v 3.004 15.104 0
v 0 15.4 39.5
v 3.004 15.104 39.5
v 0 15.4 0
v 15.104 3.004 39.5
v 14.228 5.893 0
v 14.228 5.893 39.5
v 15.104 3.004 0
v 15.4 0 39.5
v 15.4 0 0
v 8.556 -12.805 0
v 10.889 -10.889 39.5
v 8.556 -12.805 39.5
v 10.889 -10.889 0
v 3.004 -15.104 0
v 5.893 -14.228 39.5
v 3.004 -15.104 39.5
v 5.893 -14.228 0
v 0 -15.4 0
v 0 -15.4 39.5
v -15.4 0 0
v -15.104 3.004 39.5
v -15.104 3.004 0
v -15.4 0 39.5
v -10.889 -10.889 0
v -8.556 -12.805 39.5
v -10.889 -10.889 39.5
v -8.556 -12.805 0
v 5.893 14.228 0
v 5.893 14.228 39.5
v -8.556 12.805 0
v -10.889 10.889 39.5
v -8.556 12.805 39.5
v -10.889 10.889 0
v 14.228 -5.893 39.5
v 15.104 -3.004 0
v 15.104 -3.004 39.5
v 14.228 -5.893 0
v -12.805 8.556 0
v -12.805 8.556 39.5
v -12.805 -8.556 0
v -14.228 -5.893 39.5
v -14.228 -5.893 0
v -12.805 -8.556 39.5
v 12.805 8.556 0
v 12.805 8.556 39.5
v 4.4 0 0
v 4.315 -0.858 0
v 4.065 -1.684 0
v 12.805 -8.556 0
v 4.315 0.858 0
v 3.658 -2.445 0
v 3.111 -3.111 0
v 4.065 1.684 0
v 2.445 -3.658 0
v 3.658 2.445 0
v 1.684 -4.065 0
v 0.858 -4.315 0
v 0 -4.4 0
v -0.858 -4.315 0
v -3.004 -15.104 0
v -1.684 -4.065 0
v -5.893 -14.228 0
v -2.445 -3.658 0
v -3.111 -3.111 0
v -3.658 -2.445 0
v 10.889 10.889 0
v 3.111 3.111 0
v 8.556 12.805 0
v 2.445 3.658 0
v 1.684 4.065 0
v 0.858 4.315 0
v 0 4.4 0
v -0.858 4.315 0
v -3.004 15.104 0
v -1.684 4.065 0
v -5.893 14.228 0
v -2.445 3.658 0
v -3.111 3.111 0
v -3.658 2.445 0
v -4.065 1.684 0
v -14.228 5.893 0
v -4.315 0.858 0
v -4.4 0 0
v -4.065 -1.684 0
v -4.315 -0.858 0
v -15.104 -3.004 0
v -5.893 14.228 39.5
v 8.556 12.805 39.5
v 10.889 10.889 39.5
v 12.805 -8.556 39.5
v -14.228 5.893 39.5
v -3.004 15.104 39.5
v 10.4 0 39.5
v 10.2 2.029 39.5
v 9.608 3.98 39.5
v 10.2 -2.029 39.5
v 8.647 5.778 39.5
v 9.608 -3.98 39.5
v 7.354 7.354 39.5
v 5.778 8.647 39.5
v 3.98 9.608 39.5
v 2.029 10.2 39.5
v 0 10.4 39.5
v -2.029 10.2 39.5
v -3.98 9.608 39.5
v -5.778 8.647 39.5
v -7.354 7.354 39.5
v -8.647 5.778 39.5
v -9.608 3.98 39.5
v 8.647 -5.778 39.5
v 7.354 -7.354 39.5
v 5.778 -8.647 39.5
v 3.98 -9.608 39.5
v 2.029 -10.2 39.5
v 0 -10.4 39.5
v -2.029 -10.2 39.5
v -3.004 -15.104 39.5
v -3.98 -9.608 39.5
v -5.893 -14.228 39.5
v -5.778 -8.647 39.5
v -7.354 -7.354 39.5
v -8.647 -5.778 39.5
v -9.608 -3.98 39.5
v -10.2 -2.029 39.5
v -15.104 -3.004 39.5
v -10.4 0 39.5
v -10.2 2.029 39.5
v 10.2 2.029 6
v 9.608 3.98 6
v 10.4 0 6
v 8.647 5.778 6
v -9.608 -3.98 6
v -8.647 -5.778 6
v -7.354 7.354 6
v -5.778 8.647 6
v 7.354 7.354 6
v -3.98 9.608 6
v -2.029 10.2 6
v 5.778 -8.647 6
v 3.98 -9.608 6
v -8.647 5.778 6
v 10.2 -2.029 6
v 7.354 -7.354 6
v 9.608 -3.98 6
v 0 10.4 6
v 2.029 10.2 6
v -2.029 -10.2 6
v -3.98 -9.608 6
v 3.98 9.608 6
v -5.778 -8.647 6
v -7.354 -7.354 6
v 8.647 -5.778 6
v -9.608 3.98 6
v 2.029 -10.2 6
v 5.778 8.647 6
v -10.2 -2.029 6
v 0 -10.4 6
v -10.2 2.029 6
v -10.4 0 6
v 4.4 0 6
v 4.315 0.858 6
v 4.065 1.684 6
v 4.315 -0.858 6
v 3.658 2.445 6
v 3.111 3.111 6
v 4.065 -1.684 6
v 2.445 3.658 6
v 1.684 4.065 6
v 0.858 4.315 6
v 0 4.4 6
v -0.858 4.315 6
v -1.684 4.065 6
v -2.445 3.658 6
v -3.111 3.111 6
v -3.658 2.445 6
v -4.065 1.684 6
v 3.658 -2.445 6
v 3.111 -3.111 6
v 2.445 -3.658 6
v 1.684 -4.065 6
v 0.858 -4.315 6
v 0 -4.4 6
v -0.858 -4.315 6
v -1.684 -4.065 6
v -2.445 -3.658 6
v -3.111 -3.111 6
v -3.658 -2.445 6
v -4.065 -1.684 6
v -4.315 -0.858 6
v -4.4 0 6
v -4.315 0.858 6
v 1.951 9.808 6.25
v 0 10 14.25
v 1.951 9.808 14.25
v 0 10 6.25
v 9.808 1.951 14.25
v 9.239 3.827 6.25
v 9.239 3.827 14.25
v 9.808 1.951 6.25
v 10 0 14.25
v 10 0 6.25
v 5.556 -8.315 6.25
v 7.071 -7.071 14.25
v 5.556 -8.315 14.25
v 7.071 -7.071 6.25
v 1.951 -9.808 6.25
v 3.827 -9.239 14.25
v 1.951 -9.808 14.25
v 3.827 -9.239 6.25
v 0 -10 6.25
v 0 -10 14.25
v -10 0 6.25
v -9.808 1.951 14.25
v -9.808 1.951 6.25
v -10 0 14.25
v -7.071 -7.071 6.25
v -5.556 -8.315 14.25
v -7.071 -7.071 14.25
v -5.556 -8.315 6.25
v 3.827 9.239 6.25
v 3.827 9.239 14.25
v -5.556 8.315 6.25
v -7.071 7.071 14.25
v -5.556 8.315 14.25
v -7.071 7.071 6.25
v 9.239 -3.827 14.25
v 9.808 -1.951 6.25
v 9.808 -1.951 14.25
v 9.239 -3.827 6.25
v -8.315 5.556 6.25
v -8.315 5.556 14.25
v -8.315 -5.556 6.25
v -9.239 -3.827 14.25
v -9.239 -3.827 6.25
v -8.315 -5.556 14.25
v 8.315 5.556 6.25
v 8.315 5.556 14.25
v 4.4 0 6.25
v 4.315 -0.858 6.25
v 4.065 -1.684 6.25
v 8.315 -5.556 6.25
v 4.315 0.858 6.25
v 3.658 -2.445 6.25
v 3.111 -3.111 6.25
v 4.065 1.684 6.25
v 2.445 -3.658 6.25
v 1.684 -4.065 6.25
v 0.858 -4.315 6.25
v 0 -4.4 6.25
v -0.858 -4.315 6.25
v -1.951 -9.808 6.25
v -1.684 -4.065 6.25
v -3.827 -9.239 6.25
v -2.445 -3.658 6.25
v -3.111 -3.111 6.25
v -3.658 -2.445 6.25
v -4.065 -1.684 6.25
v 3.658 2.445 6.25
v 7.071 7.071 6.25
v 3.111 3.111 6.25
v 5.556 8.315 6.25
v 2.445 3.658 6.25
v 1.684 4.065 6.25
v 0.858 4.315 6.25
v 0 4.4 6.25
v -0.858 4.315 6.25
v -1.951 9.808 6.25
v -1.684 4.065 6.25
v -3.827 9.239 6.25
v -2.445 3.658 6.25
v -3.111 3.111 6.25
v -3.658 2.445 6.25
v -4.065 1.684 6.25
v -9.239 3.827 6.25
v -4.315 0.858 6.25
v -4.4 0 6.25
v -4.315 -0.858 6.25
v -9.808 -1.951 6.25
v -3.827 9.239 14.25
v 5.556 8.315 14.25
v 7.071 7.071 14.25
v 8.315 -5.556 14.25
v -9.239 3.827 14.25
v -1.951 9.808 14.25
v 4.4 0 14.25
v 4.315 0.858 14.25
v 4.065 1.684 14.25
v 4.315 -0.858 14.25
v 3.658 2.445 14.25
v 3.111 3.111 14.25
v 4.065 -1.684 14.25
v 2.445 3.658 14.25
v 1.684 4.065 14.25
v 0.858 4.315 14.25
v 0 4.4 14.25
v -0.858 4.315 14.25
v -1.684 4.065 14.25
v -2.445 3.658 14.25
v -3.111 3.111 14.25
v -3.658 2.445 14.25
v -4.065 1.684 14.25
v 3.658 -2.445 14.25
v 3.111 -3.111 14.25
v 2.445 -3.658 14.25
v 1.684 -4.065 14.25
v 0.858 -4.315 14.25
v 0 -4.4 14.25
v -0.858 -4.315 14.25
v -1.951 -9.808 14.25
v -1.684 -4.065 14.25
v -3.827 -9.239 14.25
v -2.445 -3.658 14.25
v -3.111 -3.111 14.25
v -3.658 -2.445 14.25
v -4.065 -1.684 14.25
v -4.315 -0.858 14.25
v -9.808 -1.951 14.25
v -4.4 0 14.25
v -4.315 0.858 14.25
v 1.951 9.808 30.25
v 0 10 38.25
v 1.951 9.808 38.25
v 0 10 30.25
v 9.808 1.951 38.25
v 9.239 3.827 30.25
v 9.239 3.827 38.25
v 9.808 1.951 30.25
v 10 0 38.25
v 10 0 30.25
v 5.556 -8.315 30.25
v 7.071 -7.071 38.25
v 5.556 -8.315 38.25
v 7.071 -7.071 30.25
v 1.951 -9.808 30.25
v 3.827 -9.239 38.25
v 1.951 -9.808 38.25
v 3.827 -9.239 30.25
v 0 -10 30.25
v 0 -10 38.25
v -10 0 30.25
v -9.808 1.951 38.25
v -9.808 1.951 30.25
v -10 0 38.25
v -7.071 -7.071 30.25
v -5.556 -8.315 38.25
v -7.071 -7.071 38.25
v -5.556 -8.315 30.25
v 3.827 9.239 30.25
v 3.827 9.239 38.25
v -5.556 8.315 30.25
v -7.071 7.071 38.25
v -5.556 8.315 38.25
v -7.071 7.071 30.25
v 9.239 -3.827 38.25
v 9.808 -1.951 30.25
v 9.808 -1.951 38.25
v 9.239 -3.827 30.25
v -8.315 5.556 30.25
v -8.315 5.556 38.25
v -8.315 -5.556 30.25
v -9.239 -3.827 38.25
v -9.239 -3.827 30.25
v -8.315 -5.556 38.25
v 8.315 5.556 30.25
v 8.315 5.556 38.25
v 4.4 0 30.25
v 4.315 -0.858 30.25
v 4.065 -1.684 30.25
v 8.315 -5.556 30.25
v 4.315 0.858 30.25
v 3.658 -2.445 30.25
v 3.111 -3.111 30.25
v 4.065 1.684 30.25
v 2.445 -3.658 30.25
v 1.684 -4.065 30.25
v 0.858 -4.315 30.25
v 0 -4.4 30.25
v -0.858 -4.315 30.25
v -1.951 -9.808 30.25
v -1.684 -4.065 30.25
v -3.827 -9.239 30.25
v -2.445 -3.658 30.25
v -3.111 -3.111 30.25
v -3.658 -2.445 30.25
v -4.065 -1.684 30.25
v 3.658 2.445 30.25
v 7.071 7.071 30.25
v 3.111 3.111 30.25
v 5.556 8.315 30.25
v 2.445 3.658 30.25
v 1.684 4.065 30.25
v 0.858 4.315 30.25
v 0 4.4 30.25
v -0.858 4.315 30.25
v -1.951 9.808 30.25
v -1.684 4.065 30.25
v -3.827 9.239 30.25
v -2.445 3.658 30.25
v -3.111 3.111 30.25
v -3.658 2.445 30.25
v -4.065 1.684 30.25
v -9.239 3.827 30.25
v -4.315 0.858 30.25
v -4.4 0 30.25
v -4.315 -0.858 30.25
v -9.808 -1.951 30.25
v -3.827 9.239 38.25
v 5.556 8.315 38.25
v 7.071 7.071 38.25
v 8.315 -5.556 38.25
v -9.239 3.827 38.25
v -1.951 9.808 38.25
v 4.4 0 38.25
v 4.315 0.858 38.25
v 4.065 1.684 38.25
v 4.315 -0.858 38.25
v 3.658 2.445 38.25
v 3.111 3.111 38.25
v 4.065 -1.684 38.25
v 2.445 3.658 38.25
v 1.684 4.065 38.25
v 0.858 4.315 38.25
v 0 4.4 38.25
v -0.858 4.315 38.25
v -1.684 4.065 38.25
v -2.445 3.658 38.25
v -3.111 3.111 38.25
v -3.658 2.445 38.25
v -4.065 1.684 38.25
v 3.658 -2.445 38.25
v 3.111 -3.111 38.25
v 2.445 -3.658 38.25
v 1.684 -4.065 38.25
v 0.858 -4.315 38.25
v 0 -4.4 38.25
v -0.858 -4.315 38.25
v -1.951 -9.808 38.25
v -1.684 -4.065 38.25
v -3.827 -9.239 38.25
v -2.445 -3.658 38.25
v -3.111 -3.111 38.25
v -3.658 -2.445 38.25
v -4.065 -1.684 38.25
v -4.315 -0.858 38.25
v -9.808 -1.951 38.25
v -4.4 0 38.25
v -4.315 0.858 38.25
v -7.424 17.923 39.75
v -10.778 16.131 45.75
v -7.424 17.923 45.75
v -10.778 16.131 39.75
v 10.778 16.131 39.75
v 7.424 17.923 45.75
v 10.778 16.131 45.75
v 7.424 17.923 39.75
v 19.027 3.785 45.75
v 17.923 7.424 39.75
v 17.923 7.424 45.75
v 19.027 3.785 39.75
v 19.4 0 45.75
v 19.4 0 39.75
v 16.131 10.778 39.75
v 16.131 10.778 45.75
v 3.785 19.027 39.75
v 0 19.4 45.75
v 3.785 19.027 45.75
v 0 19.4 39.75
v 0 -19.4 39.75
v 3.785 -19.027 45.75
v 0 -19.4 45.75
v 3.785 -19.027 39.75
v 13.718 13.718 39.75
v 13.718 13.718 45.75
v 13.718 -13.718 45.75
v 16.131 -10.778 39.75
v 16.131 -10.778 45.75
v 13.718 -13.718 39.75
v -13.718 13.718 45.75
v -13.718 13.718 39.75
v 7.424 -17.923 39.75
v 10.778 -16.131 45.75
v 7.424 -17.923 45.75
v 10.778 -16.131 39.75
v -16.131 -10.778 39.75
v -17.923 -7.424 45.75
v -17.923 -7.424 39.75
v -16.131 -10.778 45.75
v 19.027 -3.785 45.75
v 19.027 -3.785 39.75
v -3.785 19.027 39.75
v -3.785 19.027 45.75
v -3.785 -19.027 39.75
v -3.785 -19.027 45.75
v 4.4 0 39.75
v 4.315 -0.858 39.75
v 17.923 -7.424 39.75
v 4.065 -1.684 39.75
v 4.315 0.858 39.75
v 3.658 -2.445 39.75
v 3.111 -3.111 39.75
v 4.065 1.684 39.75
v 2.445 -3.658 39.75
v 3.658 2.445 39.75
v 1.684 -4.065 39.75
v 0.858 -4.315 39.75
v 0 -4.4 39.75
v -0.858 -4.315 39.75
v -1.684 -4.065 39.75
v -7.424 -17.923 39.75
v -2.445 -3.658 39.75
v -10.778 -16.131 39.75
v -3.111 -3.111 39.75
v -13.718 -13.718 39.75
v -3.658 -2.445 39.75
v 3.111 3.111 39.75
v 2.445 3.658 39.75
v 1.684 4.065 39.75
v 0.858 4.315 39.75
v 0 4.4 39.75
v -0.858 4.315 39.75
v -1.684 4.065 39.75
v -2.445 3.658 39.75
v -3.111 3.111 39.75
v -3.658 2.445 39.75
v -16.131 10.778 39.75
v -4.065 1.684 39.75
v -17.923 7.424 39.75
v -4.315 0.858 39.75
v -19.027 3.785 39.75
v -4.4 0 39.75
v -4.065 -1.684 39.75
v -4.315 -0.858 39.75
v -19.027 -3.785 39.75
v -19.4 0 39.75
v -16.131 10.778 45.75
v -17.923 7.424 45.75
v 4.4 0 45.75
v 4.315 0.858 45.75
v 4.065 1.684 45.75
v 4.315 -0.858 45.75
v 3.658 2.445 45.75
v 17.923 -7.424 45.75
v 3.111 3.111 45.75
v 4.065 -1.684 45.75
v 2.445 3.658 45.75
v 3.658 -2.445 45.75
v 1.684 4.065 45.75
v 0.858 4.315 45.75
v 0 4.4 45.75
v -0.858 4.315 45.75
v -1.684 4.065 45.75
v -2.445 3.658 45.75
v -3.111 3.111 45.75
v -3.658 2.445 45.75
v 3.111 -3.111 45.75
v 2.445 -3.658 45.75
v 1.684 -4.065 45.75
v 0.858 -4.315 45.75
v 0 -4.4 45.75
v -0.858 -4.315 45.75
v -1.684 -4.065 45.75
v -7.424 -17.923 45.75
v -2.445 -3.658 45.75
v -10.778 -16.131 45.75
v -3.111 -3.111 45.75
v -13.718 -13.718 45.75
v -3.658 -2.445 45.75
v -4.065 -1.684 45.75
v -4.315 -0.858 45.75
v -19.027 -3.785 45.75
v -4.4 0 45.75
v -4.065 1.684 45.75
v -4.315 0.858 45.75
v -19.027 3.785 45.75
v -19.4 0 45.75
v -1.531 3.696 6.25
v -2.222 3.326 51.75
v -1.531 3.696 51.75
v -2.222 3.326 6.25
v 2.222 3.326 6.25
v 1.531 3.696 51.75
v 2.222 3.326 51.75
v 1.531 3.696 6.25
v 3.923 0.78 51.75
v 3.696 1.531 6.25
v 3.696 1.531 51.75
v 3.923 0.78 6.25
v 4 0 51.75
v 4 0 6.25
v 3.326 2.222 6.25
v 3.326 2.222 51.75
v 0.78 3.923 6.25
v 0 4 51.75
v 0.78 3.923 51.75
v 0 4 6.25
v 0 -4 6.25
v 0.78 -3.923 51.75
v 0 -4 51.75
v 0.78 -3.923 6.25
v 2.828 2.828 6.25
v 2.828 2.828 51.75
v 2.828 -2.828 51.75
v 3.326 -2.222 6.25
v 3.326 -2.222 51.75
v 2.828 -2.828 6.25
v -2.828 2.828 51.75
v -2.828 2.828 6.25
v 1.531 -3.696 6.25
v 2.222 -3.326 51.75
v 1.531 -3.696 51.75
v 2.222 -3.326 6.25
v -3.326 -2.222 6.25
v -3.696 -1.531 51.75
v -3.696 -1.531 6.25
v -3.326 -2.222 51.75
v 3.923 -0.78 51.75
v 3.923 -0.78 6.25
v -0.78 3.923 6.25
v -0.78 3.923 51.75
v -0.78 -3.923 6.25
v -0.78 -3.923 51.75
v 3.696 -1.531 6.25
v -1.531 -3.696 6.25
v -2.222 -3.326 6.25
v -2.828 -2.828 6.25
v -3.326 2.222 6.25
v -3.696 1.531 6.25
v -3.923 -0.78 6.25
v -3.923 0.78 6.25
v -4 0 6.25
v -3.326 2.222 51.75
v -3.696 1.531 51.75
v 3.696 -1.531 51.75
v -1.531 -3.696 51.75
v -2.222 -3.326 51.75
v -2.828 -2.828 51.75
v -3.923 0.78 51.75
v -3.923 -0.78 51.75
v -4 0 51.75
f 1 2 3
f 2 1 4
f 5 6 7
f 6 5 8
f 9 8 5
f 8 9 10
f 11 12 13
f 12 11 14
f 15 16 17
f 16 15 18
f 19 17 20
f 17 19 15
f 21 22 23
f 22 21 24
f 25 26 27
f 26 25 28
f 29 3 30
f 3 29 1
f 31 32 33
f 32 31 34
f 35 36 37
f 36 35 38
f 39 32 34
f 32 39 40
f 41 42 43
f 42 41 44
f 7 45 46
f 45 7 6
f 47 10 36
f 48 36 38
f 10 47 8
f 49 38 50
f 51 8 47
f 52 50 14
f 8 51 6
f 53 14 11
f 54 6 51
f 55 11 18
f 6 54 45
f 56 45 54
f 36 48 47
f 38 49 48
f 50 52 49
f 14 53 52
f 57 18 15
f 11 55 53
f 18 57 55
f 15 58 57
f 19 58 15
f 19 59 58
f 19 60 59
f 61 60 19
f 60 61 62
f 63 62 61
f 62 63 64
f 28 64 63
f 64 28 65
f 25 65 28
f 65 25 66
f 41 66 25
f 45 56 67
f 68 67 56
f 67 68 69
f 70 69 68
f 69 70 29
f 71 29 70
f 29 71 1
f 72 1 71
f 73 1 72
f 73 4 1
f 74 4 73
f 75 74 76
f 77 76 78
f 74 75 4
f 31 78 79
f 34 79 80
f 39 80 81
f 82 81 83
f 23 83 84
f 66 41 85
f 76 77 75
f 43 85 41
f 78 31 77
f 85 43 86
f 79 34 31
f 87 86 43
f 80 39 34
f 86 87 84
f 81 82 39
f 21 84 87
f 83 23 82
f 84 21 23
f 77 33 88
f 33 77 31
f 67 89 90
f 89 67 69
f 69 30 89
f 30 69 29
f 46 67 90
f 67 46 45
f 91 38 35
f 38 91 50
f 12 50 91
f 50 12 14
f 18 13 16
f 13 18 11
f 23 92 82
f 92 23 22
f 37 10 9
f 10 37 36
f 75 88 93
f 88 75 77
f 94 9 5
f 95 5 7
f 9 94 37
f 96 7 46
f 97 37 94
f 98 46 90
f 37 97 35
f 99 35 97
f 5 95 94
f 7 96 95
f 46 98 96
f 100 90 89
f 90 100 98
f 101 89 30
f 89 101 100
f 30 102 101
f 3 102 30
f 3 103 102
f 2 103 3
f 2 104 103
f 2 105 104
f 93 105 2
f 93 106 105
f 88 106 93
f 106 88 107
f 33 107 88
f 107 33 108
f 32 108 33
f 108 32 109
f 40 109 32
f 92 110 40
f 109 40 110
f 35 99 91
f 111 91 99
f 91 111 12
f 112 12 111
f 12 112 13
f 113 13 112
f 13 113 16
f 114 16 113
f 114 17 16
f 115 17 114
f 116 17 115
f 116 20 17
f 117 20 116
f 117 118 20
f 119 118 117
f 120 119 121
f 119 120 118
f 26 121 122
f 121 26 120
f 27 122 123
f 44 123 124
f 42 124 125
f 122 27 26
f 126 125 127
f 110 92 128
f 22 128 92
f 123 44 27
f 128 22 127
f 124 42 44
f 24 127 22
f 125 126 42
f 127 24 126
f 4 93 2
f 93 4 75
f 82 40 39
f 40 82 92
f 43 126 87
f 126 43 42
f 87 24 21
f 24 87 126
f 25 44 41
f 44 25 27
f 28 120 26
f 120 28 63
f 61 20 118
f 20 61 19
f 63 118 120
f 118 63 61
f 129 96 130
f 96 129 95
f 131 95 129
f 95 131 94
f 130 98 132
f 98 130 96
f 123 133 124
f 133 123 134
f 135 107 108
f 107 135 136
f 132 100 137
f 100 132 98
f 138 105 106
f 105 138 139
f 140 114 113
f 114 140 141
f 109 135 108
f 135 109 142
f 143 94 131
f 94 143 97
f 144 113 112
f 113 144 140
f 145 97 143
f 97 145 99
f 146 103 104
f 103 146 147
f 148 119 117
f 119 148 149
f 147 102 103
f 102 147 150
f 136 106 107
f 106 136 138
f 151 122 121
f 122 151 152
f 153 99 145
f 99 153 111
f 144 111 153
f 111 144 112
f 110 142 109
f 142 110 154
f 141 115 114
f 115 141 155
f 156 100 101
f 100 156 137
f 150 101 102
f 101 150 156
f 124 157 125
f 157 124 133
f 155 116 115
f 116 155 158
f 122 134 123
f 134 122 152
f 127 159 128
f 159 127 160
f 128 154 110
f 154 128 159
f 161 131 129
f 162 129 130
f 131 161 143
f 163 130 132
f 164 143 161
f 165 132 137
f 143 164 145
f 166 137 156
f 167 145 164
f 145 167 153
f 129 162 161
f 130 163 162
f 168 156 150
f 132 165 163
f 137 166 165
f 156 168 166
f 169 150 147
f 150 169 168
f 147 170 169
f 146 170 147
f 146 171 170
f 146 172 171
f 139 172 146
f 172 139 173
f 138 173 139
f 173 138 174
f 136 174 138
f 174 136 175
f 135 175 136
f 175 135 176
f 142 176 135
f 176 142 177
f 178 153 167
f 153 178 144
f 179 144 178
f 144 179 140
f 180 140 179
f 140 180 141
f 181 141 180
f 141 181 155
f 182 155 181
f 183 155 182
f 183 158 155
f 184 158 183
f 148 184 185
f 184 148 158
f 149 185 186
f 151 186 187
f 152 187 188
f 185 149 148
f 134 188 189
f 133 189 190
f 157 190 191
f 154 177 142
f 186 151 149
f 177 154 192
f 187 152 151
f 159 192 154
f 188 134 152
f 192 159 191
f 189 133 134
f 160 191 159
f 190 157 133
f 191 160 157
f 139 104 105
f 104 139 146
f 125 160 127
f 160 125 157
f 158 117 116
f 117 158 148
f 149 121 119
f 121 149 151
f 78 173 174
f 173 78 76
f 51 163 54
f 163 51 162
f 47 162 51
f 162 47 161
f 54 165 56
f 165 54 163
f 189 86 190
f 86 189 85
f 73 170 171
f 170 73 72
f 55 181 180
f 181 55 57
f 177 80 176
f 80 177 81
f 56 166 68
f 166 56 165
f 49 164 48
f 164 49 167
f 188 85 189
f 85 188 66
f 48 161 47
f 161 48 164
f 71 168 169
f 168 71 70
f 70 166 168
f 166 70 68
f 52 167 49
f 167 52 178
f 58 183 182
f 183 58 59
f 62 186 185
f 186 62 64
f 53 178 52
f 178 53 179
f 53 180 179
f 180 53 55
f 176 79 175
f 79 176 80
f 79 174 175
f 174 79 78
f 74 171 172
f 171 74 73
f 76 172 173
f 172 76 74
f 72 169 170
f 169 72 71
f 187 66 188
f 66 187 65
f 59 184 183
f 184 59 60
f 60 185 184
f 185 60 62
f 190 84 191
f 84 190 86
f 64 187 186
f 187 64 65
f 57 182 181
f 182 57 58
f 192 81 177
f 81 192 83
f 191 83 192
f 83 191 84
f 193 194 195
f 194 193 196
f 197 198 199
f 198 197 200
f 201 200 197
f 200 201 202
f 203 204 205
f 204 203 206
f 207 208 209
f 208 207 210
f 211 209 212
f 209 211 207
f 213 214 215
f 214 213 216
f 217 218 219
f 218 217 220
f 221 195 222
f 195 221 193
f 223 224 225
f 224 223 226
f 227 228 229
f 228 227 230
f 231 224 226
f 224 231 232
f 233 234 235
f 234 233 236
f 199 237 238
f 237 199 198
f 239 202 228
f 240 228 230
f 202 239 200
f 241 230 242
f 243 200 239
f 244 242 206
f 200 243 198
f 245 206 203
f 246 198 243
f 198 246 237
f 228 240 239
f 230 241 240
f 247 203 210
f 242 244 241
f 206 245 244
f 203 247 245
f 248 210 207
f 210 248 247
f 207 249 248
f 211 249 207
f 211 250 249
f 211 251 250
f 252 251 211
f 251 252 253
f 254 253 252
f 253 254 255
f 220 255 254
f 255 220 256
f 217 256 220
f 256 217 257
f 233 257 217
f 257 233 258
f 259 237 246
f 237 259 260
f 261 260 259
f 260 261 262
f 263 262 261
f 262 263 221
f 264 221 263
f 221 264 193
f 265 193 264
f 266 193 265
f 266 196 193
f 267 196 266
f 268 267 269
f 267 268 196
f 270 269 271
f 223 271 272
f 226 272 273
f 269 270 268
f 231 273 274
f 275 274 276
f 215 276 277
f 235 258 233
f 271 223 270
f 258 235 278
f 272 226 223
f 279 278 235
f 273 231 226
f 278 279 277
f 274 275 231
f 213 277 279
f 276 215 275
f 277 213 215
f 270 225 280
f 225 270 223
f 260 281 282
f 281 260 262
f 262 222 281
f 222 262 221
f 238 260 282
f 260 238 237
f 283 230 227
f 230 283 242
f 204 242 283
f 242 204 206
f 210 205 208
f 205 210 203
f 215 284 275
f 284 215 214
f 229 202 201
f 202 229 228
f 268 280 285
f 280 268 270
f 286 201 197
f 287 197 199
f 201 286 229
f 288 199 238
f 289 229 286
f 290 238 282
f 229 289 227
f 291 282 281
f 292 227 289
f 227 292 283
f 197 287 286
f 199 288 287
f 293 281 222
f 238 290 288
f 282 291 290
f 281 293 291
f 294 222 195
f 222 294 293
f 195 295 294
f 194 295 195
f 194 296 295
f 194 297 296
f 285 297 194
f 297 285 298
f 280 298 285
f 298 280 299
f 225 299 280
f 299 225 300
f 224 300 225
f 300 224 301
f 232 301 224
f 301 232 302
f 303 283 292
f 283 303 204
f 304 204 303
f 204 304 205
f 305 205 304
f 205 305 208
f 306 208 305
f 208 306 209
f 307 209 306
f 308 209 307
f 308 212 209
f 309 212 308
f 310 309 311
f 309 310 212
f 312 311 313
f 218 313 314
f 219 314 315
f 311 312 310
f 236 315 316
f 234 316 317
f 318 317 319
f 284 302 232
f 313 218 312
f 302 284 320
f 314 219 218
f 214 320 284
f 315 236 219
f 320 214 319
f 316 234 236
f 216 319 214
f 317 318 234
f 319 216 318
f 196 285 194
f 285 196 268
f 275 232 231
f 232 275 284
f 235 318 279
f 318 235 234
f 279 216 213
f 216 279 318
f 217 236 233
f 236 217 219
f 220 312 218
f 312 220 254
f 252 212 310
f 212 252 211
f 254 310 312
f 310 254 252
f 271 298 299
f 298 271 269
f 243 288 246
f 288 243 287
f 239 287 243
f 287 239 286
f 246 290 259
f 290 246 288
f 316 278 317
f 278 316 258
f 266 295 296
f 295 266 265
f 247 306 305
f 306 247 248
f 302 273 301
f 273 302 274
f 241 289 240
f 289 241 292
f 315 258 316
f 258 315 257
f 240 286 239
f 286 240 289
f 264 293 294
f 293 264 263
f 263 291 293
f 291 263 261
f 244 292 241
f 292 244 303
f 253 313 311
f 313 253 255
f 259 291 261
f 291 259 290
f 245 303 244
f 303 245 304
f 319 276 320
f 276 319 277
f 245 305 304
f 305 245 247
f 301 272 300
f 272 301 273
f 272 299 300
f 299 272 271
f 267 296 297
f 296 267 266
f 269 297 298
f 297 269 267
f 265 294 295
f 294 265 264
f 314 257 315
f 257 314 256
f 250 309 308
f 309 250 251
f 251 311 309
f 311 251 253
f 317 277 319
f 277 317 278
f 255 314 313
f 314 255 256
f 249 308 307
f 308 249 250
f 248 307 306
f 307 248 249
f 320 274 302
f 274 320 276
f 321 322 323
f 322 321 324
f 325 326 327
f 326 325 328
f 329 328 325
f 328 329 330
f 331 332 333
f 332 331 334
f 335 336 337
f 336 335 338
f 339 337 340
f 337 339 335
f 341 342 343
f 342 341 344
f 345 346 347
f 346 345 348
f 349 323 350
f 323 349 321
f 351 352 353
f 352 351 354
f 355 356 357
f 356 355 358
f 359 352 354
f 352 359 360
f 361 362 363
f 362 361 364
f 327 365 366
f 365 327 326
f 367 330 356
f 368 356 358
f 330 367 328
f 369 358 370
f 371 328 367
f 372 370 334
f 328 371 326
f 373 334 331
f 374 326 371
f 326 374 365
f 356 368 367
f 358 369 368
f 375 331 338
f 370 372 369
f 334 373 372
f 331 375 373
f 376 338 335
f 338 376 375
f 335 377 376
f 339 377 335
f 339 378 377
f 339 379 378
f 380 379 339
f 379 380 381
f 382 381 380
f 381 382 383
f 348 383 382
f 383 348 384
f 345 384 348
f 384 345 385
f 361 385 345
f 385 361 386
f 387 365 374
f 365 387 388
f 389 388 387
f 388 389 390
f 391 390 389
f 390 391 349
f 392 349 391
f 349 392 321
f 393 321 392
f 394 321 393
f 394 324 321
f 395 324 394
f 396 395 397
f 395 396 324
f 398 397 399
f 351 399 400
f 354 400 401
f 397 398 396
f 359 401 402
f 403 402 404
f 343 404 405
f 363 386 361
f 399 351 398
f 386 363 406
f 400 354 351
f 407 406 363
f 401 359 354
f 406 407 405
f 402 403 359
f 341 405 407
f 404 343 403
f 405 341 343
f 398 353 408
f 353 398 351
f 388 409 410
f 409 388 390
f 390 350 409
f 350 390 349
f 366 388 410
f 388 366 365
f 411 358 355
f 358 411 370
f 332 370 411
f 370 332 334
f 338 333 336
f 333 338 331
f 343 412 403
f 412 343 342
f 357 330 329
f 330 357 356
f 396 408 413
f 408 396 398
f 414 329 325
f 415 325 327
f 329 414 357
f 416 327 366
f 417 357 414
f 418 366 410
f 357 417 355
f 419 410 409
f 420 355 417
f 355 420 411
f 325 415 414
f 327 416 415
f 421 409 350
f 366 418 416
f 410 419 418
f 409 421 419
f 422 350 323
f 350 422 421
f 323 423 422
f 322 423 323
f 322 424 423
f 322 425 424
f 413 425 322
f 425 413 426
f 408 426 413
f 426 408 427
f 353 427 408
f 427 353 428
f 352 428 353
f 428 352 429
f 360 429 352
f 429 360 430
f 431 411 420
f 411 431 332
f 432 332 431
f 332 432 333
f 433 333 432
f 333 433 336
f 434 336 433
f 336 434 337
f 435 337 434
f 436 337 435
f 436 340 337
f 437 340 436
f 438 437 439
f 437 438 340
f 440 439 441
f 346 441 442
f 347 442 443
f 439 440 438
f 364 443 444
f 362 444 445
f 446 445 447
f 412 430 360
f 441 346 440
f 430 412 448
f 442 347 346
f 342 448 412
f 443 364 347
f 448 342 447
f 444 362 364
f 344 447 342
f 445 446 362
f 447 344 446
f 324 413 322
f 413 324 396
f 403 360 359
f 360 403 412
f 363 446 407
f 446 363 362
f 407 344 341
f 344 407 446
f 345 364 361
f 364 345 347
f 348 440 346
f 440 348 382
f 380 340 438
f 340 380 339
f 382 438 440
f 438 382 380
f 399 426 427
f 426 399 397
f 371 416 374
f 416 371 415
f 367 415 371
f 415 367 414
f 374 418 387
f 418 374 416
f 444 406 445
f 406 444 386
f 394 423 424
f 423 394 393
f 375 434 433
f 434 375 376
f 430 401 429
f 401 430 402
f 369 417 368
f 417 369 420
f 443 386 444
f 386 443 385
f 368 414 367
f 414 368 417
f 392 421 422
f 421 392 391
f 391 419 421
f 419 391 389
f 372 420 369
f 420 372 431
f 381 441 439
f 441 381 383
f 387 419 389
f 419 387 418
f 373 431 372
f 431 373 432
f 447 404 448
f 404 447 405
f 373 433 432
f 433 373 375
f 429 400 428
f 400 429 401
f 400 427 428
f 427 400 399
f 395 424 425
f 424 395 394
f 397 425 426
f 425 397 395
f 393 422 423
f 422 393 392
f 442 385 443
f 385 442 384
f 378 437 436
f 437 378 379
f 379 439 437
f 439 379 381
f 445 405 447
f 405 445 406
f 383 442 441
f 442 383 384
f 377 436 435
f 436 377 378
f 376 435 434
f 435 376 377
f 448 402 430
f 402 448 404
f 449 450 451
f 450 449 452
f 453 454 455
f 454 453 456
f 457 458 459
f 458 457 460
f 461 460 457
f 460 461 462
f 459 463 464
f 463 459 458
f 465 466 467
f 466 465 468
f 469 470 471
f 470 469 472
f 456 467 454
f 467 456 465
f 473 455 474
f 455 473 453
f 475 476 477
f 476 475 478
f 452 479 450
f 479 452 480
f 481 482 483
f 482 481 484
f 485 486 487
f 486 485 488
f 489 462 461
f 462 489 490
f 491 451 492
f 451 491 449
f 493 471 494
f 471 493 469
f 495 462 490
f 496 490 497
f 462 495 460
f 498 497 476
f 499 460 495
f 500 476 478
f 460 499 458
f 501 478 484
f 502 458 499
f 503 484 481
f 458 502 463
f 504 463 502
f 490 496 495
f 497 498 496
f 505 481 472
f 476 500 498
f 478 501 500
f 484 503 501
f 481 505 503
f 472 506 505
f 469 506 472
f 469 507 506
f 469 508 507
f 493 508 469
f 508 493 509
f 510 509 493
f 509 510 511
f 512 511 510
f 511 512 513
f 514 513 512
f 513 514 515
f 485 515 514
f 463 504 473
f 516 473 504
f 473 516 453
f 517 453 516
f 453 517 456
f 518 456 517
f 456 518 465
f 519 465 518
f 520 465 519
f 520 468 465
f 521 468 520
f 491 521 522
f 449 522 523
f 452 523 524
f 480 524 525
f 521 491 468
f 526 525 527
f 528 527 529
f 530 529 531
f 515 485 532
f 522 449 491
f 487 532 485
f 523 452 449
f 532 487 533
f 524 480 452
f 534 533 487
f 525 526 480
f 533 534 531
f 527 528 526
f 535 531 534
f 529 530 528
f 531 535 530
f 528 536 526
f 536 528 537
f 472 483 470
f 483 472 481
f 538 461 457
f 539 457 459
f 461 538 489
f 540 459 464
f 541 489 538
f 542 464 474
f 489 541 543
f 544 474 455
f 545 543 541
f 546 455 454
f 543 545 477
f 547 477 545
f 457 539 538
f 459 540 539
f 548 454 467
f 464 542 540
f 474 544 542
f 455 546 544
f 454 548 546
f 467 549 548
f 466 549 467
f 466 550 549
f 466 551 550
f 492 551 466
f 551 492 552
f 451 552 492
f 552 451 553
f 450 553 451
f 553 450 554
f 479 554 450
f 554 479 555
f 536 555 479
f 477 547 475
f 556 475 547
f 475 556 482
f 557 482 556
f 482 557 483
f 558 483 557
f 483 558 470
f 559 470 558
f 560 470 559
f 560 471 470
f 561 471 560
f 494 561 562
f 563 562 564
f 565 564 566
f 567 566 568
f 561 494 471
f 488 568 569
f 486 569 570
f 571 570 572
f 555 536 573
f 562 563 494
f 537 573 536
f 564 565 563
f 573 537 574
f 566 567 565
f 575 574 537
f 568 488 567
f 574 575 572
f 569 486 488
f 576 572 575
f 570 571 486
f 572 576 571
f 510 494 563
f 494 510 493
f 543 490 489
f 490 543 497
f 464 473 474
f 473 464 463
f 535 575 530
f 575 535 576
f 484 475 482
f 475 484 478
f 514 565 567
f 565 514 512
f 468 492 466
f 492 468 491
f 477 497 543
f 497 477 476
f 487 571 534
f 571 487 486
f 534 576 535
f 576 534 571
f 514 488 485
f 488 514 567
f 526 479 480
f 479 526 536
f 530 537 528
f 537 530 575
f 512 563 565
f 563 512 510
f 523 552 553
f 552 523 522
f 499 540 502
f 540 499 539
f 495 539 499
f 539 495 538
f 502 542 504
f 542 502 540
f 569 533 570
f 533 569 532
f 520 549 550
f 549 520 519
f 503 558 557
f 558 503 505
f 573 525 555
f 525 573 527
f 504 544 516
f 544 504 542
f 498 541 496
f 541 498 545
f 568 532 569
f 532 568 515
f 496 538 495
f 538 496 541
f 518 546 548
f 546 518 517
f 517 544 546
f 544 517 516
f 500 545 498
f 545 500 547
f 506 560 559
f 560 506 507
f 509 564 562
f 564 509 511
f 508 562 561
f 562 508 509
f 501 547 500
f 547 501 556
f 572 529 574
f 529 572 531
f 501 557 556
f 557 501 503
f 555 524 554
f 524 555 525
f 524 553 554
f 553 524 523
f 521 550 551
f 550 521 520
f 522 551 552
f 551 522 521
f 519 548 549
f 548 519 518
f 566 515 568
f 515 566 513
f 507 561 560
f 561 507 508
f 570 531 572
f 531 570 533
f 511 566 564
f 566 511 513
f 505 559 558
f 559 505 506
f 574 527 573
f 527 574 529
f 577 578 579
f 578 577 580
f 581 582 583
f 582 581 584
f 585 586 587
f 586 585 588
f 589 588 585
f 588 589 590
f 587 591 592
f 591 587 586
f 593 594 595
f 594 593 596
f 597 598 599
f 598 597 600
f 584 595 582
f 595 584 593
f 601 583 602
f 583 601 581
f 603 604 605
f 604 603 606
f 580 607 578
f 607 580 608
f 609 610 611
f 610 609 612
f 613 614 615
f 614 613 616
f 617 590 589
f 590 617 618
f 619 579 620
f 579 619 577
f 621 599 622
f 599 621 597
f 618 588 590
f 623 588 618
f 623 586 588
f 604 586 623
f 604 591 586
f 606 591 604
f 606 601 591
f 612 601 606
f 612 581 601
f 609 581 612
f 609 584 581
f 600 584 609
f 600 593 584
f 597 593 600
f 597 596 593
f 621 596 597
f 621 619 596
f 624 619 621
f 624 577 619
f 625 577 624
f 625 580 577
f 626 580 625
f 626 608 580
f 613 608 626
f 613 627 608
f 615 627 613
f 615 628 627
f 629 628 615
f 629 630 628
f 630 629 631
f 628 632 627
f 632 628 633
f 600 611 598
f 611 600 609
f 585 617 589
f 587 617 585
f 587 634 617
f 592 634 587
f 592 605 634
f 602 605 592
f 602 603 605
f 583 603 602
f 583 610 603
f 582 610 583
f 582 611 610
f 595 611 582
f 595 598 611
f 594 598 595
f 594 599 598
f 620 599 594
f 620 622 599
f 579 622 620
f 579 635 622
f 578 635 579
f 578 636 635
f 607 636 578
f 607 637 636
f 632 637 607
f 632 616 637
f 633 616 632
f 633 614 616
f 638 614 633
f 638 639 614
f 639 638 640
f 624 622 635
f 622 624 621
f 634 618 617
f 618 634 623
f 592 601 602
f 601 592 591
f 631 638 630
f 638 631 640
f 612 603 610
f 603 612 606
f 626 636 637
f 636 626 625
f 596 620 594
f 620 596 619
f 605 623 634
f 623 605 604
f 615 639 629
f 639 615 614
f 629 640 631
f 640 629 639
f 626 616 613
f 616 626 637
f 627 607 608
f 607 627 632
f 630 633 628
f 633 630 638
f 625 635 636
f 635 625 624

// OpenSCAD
$fn = 32;

// ------------------------------------------------------------------------
// Shaft station: cup d30.8 x 39.5 mm, shaft d8
// Every part is its own module, assembly() places every instance.
// ------------------------------------------------------------------------

// --- part 1 ---
module housing_cup() {
  difference() {
    cylinder(h = 39.5, d = 30.8);
    translate([0, 0, 6]) cylinder(h = 34.5, d = 20.8);
    translate([0, 0, -1]) cylinder(h = 8, d = 8.8);
  }
}

// --- part 2 ---
module bearing_lower() {
  difference() {
      translate([0, 0, 0]) cylinder(h = 8, d = 20);
      translate([0, 0, -1]) cylinder(h = 10, d = 8.8);
    }
}

// --- part 3 ---
module bearing_upper() {
  difference() {
      translate([0, 0, 0]) cylinder(h = 8, d = 20);
      translate([0, 0, -1]) cylinder(h = 10, d = 8.8);
    }
}

// --- part 4 ---
module station_shaft() {
  translate([0, 0, -22.75]) cylinder(h = 45.5, d = 8);
}

// --- part 5 ---
module station_cover() {
  difference() {
    cylinder(h = 6, d = 38.8);
    translate([0, 0, -1]) cylinder(h = 8, d = 8.8);
  }
}

// --- assembly ---
module assembly() {
  color([0.80, 0.24, 0.20]) translate([0, 0, 0]) rotate([0, 0, 0]) housing_cup();
  color([0.20, 0.45, 0.75]) translate([0, 0, 6.25]) rotate([0, 0, 0]) bearing_lower();
  color([0.25, 0.62, 0.32]) translate([0, 0, 30.25]) rotate([0, 0, 0]) bearing_upper();
  color([0.92, 0.70, 0.18]) translate([0, 0, 29]) rotate([0, 0, 0]) station_shaft();
  color([0.58, 0.35, 0.70]) translate([0, 0, 39.75]) rotate([0, 0, 0]) station_cover();
}

assembly();
